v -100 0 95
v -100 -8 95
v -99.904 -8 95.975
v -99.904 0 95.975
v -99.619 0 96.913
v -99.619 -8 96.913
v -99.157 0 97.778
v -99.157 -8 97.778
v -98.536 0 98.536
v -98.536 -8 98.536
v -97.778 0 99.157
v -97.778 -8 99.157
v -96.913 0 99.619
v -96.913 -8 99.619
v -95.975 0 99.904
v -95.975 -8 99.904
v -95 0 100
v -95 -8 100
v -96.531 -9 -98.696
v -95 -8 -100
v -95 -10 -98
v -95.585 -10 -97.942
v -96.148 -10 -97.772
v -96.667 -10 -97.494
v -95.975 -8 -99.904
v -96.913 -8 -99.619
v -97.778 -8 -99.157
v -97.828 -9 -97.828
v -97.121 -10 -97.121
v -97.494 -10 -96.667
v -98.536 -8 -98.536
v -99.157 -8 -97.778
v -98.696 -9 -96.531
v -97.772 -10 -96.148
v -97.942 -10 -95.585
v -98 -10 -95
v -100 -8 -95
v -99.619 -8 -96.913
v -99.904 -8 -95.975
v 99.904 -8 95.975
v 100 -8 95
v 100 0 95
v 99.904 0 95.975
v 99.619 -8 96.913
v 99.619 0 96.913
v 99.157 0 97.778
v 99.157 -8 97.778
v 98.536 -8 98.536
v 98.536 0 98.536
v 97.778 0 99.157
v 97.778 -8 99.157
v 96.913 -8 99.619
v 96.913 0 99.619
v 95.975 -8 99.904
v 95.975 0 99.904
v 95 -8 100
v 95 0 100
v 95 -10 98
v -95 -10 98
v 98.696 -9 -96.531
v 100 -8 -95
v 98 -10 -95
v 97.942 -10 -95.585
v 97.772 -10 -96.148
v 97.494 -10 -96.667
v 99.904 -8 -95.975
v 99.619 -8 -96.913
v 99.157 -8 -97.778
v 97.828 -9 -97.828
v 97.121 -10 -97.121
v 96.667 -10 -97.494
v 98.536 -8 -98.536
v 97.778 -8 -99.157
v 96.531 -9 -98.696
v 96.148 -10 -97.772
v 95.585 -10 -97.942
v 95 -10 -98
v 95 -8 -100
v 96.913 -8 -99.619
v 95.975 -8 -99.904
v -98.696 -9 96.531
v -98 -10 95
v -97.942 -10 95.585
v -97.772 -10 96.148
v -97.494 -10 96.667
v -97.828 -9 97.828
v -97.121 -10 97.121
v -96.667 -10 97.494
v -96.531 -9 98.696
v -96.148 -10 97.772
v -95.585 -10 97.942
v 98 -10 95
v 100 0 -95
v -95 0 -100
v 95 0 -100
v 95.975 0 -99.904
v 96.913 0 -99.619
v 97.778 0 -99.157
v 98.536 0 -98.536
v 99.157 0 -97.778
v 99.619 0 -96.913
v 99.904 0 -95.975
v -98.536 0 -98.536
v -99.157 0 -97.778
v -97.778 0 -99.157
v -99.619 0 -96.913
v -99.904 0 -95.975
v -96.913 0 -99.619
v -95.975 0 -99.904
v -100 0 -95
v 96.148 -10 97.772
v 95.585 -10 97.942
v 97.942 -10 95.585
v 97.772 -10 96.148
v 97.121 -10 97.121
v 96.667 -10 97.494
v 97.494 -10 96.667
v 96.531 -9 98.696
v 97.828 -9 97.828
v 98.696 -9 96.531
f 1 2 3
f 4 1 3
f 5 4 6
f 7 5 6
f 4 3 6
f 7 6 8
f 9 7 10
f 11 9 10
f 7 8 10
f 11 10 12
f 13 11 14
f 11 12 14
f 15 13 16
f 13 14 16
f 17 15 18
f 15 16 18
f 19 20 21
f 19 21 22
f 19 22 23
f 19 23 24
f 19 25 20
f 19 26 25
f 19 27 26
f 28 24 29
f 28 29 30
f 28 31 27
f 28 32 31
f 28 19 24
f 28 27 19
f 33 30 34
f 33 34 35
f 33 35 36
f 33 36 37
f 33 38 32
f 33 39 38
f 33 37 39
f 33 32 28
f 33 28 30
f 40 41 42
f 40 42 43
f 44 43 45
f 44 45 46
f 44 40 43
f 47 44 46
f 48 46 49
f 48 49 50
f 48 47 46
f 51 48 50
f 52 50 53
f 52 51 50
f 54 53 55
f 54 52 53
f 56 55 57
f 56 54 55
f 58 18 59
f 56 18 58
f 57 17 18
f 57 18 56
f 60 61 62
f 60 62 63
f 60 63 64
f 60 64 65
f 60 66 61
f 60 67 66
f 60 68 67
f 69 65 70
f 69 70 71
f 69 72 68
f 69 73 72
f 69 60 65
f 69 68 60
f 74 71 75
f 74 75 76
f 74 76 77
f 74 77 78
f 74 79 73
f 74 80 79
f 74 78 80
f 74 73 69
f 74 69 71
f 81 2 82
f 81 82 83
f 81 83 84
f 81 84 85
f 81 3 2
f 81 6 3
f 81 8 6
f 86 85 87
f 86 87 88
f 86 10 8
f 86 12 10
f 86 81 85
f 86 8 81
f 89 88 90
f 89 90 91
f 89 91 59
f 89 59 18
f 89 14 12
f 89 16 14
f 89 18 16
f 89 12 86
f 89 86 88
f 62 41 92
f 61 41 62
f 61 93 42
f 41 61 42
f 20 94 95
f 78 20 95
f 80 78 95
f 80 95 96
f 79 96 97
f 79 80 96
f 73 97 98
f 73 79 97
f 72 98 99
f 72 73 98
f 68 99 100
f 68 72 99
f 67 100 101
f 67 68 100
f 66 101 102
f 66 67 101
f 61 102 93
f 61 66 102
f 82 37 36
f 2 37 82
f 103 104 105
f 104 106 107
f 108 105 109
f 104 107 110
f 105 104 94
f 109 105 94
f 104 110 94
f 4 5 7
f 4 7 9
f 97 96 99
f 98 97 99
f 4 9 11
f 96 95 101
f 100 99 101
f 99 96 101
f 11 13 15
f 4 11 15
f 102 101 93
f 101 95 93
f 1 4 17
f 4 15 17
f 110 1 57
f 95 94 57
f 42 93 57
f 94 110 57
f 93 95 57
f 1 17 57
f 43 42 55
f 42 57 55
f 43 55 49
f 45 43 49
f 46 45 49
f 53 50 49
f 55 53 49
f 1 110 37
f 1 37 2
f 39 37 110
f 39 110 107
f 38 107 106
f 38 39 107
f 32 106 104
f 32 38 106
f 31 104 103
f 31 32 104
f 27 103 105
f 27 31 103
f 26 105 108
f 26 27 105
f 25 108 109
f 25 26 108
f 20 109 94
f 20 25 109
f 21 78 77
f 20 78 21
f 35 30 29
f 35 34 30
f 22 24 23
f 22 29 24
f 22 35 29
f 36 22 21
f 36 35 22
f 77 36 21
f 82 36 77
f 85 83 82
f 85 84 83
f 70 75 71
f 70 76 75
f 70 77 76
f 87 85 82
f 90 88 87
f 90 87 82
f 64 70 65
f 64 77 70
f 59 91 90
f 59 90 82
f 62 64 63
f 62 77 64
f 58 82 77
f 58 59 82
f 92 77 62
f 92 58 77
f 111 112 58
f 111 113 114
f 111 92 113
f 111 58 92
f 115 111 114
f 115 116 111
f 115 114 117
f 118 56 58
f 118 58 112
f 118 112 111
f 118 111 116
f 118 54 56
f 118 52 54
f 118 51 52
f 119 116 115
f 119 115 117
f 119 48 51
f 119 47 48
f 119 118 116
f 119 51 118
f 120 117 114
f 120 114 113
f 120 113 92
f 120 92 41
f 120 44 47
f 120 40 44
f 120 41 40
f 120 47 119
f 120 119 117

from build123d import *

# Parameters (mm, degrees)
F0_W     = 200
F0_H     = 200
F1_DEPTH = 10
F2_R     = 5
F3_SIZE  = 2


with BuildPart() as f1:
    # F0 (on Front) → F1 (new body)
    with BuildSketch(Plane.XZ):
        Rectangle(F0_W, F0_H)
    extrude(amount=F1_DEPTH)

    # F2
    f2_edges = [f1.edges().sort_by_distance(p)[0] for p in [
        (100, -5, -100),
        (-100, -5, -100),
        (-100, -5, 100),
        (100, -5, 100),
    ]]
    fillet(f2_edges, radius=F2_R)

    # F3
    f3_edges = [f1.edges().sort_by_distance(p)[0] for p in [
        (0, -10, 100),
        (98.535534, -10, 98.535534),
        (-98.535534, -10, 98.535534),
        (100, -10, 0),
        (-100, -10, 0),
        (98.535534, -10, -98.535534),
        (-98.535534, -10, -98.535534),
        (0, -10, -100),
    ]]
    chamfer(f3_edges, length=F3_SIZE)


solid = f1.part
